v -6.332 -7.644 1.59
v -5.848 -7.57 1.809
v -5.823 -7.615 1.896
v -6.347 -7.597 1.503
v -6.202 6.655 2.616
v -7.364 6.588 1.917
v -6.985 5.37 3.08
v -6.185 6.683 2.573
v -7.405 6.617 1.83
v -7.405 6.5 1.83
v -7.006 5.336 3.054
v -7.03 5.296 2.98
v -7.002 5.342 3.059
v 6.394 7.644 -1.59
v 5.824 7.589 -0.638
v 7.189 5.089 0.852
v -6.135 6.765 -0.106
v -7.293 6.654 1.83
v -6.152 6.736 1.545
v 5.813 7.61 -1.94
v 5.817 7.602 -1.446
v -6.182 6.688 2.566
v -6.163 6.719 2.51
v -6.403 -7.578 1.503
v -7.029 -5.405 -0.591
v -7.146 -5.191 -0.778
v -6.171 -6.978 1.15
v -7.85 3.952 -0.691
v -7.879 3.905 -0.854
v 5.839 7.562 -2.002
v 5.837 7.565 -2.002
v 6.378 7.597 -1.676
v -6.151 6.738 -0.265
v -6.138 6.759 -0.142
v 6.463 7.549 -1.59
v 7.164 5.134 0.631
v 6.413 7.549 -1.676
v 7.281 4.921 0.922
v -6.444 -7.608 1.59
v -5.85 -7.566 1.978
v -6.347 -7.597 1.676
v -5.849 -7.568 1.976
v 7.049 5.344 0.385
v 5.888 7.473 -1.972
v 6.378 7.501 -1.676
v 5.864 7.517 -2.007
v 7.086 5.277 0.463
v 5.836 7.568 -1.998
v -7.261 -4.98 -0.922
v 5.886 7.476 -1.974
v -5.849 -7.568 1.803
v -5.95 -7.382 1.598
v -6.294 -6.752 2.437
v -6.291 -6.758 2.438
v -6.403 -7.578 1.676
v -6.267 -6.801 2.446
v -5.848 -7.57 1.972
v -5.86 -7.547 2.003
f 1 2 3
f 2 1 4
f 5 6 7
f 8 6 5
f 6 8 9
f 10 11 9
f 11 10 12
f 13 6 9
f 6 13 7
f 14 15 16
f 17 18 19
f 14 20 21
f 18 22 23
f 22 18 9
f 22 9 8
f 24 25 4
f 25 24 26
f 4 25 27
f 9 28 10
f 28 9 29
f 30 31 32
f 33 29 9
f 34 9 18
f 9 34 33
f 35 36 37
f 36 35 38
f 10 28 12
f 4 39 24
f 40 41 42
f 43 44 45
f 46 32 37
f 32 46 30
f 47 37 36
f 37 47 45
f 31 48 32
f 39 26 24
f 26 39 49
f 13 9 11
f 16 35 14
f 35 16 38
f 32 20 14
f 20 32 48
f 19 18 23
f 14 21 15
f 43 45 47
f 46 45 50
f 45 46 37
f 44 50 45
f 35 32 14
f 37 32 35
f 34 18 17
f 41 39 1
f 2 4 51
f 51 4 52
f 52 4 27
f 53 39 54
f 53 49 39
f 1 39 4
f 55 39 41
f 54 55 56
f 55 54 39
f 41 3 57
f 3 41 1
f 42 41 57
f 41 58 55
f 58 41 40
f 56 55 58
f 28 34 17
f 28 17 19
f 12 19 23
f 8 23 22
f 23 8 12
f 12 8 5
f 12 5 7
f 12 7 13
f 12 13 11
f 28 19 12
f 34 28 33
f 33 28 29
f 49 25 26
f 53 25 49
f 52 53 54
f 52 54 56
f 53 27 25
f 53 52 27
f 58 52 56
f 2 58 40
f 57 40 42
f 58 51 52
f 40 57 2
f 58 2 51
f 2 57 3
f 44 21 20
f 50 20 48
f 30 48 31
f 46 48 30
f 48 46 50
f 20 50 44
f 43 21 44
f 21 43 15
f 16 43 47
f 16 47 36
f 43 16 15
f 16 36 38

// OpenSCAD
// Auto-generated OpenSCAD file

    inner_points = 10*[[-0.5067955693093701, -0.2765711460282869, 0.8164965809276397], [0.47903674428989906, -0.8777932204727784, 1.4395706848802092e-12], [-0.47903813632393366, 0.8777957186404731, -1.4395706848802092e-12], [0.4929154607816119, -0.3006097881369385, 0.8164965809284891], [-0.5206742858010829, -0.8537545783641267, 5.901945598907332e-13], [0.5206728937670484, 0.8537570765318214, -5.901945598907332e-13], [0.013878020474695501, 0.577184681419687, 0.8164965809270495], [0.9997103340739647, -0.024037393024804222, 8.493389008763497e-13], [-0.9997117261079992, 0.02403989119249895, -8.493389008763497e-13]];

    outer_points = 10*[[-0.512923269542972, -0.04952440908620236, 0.8570046980419713], [0.8557409845176946, 0.04952440908620236, 0.5150288344562363], [-0.8557409845176946, -0.04952440908620236, -0.5150288344562363], [0.12336155278650156, 0.7053703515917454, 0.6980219154077046], [0.21945616218822123, -0.7053703515917454, 0.674011617090503], [-0.21945616218822123, 0.7053703515917454, -0.674011617090503], [-0.7323794317311931, 0.6558459425055431, 0.1829930809514684], [0.6362848223294735, 0.7548947606779478, -0.15898278263426666], [-0.6362848223294735, -0.7548947606779478, 0.15898278263426666]];

    // Convex hull for inner set (I)
    module inner_hull() {
        hull() {
            for (p = inner_points) {
                translate(p) sphere(r=0.1);
            }
        }
    }

    // Convex hull for outer set (O) minus inner hull (O \ I)
    module outer_minus_inner() {
        difference() {
            hull() {
                for (p = outer_points) {
                    translate(p) sphere(r=0.1);
                }
            }
            inner_hull(); // Subtract inner hull
        }
    }

    // Convex hull for outer set (O) minus all translated inner hulls
    module outer_minus_AllTranslationInner() {
        difference() {
            hull() {
                for (p = outer_points) {
                    translate(p) sphere(r=0.1);
                }
            }
            hull() {
                translate([0,0,50]) inner_hull();
                translate([0,0,-50]) inner_hull();
            }; // Subtract translated inner hulls
        }
    }

    // Difference between outer_minus_inner and outer_minus_AllTranslationInner
    module outer_minus_inner_diff() {
        difference() {
            // Outer minus inner
            difference() {
                hull() {
                    for (p = outer_points) {
                        translate(p) sphere(r=0.1);
                    }
                }
                inner_hull();
            }

            // Subtract Outer minus AllTranslationInner
            difference() {
                hull() {
                    for (p = outer_points) {
                        translate(p) sphere(r=0.1);
                    }
                }
                hull() {
                    translate([0,0,50]) inner_hull();
                    translate([0,0,-50]) inner_hull();
                };
            }
        }
    }

    // Rendering all with colors applied
    color([0, 1, 0, 1]) outer_minus_AllTranslationInner(); // Opaque green
    
